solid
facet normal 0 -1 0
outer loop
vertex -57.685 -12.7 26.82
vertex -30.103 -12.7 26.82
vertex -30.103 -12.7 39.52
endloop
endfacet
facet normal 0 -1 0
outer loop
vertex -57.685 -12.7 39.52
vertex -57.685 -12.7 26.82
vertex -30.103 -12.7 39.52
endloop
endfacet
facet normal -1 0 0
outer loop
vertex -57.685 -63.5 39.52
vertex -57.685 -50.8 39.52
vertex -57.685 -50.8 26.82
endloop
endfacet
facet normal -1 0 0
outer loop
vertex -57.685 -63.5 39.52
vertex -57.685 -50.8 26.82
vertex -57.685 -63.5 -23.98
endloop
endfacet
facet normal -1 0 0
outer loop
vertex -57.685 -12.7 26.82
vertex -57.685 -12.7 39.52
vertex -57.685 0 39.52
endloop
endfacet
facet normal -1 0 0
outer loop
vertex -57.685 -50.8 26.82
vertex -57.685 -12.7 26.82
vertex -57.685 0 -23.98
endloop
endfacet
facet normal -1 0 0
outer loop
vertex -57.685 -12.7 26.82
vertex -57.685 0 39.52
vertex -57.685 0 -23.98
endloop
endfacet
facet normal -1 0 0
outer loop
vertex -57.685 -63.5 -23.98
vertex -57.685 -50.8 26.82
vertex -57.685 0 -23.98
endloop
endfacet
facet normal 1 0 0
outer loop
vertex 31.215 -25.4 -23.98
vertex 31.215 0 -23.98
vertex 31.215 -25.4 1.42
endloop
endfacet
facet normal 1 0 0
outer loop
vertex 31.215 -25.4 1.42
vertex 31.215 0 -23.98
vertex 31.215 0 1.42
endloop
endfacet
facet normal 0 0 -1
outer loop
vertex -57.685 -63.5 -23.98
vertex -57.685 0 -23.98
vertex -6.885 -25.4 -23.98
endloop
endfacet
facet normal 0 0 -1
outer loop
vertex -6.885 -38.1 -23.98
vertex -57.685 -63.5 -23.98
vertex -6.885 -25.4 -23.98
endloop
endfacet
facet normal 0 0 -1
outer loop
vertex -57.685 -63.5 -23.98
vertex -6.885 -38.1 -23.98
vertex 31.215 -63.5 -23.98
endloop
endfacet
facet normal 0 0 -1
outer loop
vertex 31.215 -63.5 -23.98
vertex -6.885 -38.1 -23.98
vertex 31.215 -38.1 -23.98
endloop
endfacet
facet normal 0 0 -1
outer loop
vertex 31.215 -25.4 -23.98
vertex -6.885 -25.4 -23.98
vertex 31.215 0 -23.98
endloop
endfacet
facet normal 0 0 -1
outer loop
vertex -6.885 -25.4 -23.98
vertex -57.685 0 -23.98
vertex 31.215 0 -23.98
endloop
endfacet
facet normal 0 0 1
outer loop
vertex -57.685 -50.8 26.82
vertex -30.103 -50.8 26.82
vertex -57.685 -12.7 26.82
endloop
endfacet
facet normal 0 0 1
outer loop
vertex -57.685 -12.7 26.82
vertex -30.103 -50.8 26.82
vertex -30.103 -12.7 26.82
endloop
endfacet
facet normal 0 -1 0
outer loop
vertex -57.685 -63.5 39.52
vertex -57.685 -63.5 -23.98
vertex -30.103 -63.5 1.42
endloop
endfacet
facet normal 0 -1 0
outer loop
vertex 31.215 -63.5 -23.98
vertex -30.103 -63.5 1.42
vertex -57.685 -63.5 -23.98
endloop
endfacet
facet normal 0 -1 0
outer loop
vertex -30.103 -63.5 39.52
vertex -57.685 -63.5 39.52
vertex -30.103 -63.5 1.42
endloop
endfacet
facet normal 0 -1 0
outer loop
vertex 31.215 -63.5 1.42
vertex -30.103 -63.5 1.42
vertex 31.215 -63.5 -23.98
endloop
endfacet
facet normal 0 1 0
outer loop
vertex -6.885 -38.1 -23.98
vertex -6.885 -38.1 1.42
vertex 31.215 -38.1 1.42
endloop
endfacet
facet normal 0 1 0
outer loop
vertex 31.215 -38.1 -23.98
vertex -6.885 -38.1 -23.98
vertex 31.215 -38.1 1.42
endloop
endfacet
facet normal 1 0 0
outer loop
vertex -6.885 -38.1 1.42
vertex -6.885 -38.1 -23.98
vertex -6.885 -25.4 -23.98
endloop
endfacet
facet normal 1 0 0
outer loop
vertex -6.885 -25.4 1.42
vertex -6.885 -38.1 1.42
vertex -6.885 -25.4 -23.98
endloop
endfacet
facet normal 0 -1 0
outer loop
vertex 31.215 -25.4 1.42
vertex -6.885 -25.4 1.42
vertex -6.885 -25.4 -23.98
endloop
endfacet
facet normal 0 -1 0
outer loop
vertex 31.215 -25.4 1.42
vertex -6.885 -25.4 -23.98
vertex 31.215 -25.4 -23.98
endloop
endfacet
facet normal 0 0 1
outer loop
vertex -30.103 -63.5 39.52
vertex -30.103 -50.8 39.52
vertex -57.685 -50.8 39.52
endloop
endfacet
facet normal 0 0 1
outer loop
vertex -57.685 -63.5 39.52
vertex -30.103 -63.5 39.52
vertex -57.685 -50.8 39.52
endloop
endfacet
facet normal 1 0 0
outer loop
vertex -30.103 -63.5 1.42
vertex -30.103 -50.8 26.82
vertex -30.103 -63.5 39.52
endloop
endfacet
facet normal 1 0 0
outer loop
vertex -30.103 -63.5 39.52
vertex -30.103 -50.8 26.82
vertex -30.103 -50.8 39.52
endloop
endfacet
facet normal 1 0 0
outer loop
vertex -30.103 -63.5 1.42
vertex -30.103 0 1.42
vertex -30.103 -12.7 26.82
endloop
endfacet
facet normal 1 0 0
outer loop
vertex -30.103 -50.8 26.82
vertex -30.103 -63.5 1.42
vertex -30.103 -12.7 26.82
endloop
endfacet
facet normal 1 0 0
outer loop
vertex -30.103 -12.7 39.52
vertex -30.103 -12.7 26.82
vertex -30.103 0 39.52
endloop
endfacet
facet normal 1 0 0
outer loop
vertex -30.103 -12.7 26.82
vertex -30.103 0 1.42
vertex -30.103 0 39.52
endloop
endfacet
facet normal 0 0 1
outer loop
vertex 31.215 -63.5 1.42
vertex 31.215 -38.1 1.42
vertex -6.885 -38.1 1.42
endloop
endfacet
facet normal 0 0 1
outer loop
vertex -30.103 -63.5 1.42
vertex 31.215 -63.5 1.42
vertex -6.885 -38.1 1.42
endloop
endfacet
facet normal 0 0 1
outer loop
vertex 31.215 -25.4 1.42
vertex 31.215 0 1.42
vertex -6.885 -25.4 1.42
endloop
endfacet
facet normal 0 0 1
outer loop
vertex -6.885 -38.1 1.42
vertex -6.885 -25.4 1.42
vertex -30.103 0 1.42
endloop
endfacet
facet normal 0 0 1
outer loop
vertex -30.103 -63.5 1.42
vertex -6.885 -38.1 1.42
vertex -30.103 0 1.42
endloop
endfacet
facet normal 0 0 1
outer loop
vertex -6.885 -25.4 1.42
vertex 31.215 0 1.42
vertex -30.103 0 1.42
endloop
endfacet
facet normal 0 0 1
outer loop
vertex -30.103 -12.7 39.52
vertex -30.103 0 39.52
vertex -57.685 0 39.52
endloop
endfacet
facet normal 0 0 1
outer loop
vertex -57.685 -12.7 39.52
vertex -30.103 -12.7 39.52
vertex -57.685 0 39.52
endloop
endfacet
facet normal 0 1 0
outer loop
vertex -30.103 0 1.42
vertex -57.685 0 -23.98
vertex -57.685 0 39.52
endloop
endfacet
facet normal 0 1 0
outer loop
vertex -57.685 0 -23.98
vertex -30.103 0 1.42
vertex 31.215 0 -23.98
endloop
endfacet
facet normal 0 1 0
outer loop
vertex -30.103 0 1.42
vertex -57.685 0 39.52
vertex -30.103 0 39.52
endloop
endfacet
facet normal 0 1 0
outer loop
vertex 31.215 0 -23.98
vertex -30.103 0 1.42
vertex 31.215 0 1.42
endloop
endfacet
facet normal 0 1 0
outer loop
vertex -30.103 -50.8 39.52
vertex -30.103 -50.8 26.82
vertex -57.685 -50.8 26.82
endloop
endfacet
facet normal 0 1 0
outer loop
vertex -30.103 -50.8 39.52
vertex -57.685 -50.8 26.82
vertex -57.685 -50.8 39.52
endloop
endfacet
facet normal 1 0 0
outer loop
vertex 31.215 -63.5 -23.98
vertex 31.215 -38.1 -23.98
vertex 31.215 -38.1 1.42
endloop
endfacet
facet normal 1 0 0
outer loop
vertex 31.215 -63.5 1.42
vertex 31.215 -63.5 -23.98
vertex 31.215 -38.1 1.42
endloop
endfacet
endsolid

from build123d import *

# Parameters (mm, degrees)
F1_DEPTH = 63.5
F2_W     = 38.1
F2_H     = 12.7
F3_DEPTH = 27.583812
F4_W     = 38.1
F4_H     = 12.7
F5_DEPTH = 25.401


with BuildPart() as f1:
    # F0 (on Front) → F1 (new body)
    with BuildSketch(Plane.XZ):
        Polygon((-30.102565, 39.520449), (-57.685377, 39.520449), (-57.685377, -23.979551), (31.214621, -23.979551), (31.214621, 1.420449), (-30.102565, 1.420449), align=None)
    extrude(amount=F1_DEPTH)

    # F2 (on face) → F3 (cut, through all)
    with BuildSketch(Plane.YZ.offset(-30.102565)):
        with Locations((-31.75, 33.170449)):
            Rectangle(F2_W, F2_H)
    extrude(amount=-F3_DEPTH, mode=Mode.SUBTRACT)

    # F4 (on face) → F5 (cut, through all)
    with BuildSketch(Plane.XY.offset(1.420449)):
        with Locations((12.164621, -31.75)):
            Rectangle(F4_W, F4_H)
    extrude(amount=-F5_DEPTH, mode=Mode.SUBTRACT)


solid = f1.part
